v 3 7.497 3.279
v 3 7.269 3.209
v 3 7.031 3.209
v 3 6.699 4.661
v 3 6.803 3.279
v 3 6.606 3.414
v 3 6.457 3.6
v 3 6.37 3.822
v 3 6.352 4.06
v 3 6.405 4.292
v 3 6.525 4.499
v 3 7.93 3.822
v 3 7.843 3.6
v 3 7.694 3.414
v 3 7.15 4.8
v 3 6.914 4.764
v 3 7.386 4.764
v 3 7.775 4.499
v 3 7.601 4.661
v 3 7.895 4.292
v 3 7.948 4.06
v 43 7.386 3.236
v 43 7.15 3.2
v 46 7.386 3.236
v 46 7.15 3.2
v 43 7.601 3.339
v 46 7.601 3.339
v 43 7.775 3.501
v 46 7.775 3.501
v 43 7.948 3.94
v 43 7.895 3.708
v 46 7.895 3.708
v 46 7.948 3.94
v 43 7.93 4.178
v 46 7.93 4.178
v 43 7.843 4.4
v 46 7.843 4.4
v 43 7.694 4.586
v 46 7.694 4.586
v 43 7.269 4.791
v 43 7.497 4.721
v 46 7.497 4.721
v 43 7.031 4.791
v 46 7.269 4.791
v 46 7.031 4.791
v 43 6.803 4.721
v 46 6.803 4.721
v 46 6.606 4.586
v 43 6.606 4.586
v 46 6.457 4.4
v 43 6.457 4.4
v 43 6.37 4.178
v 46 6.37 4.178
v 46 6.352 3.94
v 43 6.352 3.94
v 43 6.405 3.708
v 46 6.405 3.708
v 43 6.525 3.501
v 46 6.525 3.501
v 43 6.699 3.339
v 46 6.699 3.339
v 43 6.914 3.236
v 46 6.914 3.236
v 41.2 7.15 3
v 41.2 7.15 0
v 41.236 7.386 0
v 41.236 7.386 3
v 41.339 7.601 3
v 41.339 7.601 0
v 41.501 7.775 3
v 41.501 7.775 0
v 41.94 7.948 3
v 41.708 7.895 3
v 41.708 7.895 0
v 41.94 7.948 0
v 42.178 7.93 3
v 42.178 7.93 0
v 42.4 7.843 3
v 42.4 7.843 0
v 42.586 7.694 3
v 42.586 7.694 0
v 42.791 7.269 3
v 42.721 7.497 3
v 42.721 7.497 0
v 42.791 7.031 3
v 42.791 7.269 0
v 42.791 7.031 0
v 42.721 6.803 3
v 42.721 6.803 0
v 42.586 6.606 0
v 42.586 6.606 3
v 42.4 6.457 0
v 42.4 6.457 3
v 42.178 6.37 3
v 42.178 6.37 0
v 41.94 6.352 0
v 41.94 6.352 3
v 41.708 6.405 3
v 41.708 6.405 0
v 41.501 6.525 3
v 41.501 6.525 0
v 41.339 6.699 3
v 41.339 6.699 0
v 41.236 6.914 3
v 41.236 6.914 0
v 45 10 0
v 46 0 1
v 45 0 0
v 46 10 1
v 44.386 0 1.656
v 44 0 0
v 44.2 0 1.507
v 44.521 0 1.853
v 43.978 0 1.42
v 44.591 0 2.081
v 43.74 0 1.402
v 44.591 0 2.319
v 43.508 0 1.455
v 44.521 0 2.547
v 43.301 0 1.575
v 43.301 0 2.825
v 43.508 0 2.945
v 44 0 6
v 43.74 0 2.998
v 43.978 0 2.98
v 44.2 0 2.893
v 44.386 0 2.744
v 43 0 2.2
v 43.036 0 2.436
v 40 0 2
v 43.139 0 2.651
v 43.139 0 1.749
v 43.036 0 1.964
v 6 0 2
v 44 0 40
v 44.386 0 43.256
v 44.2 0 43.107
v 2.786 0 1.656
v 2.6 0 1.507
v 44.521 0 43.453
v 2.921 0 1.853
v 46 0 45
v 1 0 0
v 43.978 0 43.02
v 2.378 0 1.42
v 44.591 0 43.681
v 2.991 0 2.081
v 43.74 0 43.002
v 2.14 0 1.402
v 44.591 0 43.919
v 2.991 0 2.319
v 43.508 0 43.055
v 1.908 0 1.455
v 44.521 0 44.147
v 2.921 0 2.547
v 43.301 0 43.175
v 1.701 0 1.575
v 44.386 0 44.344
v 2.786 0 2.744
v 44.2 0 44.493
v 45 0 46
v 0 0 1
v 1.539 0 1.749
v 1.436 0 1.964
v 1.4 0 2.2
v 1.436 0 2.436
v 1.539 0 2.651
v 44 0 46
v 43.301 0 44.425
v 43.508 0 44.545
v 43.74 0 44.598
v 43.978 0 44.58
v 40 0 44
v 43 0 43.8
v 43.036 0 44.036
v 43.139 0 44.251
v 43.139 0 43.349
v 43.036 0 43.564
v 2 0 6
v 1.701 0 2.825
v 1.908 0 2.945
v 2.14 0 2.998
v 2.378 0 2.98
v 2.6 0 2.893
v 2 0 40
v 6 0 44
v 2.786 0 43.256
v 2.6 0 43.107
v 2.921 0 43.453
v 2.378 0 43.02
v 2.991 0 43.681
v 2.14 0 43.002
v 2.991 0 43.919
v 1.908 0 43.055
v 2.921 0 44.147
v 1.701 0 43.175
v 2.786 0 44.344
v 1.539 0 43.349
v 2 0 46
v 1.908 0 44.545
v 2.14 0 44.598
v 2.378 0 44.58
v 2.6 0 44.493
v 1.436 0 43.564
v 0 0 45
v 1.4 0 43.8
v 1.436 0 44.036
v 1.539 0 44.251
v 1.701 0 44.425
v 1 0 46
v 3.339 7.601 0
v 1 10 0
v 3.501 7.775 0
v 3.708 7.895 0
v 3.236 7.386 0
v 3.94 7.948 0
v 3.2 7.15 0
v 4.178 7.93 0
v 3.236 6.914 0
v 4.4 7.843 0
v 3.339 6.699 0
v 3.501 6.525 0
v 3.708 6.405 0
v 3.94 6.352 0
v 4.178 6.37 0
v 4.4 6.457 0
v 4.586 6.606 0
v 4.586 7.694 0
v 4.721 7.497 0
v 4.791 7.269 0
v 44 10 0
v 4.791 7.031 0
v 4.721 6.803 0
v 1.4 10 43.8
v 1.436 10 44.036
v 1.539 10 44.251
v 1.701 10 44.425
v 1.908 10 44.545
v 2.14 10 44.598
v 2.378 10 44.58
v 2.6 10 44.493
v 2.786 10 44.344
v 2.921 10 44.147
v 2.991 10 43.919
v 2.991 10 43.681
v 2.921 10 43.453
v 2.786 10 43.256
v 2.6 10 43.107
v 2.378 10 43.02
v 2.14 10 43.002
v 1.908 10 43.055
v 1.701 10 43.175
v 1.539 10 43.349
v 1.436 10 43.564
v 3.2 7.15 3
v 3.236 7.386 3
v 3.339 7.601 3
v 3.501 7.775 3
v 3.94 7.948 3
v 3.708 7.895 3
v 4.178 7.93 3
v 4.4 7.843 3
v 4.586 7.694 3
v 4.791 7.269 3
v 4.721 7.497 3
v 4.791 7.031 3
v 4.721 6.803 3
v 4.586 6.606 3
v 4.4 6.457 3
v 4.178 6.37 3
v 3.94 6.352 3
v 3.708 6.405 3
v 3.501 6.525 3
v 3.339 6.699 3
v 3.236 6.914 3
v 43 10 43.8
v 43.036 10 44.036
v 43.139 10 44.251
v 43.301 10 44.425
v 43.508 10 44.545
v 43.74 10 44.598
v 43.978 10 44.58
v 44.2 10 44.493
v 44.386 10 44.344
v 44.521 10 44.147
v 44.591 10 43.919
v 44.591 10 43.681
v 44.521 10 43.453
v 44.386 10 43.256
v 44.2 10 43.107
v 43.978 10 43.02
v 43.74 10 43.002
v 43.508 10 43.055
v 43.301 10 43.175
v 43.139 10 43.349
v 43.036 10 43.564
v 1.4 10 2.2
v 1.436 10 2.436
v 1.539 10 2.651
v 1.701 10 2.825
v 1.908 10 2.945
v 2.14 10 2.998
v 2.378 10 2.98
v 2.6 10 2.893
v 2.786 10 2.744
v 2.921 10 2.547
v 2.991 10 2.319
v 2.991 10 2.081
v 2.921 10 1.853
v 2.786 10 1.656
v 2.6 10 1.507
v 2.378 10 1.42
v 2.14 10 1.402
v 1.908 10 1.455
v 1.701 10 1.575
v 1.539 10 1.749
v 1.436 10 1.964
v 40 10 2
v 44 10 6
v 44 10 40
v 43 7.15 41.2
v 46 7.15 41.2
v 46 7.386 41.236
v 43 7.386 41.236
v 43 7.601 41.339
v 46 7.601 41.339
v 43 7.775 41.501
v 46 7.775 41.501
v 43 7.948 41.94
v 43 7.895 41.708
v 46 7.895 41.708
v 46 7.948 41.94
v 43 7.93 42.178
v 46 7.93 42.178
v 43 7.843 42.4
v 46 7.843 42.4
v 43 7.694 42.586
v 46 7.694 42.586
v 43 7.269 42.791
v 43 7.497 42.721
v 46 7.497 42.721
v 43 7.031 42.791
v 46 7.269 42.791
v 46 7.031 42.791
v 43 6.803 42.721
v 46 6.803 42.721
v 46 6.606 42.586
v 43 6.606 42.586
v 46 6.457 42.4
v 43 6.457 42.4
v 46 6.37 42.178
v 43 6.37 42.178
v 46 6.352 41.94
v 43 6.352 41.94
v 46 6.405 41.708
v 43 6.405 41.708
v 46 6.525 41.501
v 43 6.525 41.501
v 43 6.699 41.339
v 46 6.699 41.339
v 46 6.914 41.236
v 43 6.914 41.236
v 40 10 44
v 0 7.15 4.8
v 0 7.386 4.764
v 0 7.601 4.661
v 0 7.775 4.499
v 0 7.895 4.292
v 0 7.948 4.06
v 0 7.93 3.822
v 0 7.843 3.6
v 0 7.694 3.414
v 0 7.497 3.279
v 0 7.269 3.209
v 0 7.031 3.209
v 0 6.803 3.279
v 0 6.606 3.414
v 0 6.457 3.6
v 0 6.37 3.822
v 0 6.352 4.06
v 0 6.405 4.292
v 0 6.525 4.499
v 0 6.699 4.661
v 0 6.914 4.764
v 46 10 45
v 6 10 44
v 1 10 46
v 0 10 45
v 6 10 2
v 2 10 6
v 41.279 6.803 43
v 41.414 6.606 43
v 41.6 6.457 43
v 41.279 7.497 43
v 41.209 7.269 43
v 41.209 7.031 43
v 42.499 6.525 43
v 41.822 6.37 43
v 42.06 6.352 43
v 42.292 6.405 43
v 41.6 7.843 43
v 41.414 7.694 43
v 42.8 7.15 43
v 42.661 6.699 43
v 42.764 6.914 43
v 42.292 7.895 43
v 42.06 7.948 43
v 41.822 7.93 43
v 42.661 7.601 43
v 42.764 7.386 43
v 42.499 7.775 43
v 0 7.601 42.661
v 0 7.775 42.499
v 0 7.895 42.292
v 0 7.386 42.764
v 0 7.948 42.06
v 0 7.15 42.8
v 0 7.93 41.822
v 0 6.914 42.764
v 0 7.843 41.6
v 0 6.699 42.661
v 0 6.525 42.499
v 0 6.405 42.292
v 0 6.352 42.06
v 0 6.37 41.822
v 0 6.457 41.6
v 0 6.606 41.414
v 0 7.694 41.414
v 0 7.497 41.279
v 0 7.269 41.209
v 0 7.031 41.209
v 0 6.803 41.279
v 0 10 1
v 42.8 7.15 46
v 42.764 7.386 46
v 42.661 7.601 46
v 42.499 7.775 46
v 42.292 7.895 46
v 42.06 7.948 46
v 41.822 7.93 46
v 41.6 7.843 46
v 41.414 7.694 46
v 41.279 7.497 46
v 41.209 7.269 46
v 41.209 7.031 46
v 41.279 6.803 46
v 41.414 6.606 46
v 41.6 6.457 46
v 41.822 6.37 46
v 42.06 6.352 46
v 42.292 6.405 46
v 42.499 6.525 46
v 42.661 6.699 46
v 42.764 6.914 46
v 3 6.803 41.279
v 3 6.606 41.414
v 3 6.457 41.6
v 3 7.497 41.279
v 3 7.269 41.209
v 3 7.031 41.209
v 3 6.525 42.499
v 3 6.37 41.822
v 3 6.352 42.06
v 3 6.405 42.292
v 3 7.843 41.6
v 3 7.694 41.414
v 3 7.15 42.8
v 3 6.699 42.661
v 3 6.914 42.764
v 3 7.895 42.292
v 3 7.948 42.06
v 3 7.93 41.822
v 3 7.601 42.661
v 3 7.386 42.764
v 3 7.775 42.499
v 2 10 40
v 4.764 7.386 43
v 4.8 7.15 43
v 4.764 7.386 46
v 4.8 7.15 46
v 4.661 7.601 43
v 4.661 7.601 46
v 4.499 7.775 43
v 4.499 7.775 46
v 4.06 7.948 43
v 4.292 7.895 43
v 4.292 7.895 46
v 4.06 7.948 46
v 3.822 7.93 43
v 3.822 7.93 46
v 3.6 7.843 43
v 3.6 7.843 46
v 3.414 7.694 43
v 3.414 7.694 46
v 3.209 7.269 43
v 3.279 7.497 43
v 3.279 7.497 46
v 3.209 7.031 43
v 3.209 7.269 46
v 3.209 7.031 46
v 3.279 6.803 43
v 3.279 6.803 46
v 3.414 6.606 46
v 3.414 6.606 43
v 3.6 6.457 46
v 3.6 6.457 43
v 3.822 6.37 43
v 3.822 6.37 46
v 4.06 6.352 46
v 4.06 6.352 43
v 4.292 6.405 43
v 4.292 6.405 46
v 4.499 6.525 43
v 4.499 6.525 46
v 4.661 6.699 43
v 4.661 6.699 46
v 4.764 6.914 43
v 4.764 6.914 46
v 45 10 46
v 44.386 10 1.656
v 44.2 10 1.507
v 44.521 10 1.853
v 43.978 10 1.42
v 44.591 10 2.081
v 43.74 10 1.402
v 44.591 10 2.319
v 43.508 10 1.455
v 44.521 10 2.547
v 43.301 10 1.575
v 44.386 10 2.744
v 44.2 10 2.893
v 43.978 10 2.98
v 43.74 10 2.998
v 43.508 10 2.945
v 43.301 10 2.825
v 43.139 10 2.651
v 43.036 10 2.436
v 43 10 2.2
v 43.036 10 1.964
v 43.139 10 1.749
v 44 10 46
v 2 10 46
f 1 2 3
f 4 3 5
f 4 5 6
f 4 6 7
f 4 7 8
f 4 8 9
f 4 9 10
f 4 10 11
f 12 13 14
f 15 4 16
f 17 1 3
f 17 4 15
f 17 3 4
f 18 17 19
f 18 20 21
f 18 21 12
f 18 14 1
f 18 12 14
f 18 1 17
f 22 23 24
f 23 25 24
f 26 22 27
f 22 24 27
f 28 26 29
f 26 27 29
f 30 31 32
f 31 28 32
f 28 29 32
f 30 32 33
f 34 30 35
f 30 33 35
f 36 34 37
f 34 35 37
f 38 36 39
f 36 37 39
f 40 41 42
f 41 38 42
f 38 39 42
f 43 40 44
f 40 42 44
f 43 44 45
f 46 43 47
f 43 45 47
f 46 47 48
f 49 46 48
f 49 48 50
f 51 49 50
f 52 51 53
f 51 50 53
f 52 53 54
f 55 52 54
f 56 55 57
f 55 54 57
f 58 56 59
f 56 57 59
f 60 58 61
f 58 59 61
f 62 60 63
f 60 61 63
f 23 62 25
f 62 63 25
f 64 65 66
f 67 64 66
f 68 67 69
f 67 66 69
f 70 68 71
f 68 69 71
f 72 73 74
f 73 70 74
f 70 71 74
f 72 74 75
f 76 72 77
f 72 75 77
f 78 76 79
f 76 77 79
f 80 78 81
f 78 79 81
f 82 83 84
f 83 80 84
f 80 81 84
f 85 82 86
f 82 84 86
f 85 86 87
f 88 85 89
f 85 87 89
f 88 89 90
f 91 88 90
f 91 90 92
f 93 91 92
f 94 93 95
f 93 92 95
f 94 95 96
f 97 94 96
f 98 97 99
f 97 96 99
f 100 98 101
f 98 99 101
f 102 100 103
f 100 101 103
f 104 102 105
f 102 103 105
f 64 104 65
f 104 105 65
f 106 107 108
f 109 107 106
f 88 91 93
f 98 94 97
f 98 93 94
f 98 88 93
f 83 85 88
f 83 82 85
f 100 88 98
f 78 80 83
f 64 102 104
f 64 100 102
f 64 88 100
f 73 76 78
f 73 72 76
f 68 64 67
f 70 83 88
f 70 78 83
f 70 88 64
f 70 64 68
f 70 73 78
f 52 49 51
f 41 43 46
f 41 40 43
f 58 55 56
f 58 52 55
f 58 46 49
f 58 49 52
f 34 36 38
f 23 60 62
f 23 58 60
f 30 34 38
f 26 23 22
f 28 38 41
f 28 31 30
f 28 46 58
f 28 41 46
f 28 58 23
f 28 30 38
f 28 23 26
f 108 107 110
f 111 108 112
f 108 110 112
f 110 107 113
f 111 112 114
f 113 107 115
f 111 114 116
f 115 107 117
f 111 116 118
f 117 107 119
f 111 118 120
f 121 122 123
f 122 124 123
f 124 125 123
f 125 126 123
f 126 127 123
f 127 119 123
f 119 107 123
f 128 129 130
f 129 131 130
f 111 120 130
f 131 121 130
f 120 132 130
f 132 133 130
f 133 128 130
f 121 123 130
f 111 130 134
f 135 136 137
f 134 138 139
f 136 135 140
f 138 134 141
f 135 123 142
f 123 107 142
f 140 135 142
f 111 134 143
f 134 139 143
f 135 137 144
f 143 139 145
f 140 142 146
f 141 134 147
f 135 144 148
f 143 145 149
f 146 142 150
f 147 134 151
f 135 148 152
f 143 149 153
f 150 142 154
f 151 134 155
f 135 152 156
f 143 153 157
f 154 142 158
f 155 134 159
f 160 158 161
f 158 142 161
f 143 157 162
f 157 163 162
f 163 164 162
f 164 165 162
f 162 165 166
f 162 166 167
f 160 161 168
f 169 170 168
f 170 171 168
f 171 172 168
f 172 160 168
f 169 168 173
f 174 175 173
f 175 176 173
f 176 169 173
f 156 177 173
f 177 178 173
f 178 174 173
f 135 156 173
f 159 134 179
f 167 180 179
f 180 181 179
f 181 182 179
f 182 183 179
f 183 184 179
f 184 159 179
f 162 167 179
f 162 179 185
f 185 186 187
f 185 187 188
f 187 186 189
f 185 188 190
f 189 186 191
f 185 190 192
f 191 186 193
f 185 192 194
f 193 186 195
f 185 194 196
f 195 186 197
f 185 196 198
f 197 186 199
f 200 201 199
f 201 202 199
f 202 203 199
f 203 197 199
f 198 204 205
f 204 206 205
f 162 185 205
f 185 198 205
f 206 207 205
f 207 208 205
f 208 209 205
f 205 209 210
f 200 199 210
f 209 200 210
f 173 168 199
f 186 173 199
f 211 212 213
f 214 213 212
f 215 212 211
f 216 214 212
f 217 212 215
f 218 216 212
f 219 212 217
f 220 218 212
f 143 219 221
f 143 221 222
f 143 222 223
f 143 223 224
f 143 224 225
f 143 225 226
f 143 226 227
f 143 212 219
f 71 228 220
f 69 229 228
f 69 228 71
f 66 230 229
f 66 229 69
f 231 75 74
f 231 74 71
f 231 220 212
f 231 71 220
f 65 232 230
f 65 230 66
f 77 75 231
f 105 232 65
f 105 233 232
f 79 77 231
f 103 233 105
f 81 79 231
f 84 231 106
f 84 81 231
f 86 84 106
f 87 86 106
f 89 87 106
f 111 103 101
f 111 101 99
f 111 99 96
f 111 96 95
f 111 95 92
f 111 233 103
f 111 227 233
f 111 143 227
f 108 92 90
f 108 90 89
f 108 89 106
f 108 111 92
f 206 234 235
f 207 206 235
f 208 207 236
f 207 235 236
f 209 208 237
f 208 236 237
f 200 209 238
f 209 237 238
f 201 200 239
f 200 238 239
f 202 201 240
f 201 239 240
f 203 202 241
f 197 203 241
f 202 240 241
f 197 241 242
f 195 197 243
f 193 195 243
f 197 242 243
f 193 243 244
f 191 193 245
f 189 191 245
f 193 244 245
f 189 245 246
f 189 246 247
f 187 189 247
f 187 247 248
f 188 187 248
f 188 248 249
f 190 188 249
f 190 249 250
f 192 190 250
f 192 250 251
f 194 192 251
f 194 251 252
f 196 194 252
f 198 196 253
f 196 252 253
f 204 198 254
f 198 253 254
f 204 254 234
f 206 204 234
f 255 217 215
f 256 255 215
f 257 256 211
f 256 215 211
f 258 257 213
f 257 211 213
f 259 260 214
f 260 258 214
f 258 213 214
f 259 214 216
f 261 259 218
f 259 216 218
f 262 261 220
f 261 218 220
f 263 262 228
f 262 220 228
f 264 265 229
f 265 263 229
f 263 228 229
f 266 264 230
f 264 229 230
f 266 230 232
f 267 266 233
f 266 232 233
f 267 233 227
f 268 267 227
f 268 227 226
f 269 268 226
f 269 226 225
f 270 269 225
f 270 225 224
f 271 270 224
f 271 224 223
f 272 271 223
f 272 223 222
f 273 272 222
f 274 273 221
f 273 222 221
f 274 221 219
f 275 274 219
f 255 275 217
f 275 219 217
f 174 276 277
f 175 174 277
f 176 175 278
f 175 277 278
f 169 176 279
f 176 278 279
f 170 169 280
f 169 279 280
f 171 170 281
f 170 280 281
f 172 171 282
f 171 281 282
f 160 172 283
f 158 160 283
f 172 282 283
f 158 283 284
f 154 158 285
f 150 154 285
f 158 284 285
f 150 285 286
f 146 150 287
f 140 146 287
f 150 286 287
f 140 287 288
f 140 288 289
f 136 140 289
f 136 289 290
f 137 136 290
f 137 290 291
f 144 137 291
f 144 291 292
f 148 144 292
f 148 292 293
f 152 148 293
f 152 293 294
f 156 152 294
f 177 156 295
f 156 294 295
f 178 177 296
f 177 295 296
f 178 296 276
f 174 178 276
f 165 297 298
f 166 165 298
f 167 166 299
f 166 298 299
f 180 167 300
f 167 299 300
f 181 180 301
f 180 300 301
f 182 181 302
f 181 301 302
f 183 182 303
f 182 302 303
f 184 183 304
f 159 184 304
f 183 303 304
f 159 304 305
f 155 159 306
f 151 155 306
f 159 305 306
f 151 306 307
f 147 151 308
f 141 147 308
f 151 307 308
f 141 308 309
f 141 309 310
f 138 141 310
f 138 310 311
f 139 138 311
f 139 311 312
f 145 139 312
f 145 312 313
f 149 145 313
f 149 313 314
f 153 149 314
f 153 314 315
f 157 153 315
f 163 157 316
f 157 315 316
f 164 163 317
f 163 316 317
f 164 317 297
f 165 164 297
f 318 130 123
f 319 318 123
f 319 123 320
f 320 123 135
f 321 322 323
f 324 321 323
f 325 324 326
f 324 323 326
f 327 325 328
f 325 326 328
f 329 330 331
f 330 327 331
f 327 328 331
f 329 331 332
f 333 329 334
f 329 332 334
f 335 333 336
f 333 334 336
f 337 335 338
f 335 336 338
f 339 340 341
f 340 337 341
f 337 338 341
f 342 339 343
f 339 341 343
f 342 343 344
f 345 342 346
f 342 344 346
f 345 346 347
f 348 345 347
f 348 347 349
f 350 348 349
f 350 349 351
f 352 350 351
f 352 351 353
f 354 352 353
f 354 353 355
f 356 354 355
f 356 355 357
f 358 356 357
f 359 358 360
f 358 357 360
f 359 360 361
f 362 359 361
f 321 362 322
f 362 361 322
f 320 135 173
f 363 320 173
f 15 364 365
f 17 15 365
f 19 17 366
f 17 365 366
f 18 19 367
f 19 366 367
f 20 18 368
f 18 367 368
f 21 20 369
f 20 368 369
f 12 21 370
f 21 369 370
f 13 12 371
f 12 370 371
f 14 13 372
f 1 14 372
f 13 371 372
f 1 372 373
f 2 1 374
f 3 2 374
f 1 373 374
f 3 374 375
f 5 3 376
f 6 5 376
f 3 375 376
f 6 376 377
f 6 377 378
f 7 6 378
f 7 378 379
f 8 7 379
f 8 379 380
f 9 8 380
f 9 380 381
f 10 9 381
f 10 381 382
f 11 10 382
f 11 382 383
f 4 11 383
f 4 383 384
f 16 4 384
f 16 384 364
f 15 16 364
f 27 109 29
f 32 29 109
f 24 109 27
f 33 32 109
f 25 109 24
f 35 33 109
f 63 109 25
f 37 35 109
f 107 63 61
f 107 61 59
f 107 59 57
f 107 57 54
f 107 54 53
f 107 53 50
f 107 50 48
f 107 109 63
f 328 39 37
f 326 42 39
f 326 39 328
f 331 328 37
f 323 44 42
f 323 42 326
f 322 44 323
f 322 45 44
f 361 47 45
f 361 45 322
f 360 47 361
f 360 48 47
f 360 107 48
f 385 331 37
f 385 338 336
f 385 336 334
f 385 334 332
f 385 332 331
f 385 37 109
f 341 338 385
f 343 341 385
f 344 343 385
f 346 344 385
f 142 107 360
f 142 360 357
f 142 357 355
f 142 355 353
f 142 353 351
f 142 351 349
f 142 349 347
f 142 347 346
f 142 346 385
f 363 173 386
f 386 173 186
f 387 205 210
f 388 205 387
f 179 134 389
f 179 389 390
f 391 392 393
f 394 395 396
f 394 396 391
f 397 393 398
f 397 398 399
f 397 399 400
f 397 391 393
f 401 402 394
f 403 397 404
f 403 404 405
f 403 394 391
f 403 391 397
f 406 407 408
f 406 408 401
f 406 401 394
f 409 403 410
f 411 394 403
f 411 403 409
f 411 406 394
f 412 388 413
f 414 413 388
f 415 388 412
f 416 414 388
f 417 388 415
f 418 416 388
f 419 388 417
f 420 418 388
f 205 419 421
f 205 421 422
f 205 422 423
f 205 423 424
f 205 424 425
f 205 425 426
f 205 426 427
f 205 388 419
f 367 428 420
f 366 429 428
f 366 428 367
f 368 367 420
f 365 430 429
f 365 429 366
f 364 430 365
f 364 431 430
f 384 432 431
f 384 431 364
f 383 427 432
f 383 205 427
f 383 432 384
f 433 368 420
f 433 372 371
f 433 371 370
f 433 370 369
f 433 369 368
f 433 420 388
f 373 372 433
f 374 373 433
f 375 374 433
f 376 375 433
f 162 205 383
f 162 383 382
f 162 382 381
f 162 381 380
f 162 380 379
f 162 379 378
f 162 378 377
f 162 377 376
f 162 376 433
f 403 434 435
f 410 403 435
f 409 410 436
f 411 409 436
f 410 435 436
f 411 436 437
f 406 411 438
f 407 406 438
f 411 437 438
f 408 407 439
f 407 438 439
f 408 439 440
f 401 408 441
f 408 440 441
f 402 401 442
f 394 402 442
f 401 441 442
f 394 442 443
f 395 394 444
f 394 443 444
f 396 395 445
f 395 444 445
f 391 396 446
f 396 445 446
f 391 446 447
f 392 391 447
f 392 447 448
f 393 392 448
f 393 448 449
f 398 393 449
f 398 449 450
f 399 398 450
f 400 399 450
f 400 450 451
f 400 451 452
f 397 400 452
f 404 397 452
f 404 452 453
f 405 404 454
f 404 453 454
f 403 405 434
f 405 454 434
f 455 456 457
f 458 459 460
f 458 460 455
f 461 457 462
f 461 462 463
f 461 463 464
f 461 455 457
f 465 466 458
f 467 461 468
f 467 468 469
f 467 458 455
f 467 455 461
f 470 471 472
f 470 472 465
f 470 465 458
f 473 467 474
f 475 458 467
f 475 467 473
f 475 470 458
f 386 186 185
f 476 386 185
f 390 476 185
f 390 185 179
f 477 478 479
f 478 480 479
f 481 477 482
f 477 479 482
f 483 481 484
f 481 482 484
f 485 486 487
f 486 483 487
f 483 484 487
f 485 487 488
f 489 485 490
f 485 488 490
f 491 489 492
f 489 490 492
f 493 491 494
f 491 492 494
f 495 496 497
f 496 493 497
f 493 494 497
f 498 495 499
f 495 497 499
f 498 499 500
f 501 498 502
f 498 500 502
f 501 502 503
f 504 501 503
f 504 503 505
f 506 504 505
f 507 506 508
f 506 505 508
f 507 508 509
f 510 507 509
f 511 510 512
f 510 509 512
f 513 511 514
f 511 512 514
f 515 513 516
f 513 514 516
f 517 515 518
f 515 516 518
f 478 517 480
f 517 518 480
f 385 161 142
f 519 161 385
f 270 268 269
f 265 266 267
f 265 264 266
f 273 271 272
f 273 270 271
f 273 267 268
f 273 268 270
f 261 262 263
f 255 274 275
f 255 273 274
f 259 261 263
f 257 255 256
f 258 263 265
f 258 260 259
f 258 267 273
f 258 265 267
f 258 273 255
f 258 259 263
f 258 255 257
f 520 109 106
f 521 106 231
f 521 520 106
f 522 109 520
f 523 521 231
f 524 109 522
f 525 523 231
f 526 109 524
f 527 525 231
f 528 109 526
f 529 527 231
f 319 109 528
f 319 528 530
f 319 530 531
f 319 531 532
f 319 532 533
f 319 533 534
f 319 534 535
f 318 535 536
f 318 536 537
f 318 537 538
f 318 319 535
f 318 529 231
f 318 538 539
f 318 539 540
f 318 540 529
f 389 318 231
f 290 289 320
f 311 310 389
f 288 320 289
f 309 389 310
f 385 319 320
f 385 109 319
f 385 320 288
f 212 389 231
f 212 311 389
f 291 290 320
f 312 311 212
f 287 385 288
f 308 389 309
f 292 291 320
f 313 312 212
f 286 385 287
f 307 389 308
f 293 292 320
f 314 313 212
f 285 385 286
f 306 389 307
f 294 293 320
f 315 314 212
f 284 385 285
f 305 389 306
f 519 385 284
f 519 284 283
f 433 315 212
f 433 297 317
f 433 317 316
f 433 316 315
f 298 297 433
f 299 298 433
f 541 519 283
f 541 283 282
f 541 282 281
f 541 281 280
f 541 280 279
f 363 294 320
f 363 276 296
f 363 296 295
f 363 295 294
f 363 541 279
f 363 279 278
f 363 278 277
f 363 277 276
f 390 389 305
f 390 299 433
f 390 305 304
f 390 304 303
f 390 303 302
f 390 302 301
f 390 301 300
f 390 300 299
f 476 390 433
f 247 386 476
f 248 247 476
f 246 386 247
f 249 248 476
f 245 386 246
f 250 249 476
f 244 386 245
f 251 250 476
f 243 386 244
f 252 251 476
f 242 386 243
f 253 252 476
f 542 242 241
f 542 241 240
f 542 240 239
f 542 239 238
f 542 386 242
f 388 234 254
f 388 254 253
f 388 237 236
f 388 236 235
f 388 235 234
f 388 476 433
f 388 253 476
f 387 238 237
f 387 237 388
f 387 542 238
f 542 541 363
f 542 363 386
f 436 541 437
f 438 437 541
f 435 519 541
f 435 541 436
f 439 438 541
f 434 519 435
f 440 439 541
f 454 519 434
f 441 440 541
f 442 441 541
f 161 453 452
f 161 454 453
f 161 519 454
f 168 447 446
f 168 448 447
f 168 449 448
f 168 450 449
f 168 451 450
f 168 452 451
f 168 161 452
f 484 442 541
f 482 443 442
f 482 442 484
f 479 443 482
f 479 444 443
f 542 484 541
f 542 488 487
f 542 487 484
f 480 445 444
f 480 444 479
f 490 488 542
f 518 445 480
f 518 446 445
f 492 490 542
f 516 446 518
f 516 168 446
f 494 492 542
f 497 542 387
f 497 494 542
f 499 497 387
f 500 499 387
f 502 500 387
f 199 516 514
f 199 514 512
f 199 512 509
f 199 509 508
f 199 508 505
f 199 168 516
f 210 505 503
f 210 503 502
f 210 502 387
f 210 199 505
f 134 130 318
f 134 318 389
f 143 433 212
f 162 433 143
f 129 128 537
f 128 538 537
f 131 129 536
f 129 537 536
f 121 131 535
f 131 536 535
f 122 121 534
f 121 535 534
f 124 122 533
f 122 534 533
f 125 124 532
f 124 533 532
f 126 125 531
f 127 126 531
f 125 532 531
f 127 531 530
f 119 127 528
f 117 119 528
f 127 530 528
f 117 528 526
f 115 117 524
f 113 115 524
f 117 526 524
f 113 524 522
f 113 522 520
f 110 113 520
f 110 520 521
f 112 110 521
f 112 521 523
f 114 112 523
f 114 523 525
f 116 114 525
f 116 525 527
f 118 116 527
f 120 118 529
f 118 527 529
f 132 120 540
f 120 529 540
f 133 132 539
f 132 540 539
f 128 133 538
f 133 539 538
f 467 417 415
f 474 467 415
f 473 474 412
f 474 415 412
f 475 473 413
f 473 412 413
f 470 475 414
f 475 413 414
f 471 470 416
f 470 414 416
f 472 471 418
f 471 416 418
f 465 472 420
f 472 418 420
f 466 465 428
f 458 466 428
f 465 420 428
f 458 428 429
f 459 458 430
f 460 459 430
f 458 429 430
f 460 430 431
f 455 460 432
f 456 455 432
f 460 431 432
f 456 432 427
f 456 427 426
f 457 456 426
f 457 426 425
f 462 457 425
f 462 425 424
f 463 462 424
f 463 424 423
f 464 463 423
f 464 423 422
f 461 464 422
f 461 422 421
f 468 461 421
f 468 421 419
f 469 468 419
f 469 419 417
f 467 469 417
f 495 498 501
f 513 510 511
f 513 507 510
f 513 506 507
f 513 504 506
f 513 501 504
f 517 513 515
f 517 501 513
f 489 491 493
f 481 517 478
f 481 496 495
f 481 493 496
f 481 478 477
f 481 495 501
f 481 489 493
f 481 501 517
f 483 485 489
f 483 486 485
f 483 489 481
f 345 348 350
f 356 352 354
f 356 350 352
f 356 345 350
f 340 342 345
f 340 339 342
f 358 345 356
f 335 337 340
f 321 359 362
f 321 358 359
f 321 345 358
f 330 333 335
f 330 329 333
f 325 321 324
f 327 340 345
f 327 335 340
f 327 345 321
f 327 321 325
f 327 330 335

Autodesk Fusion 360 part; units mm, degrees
sketch "Sketch1" plane through (0, 0, 0) normal (0, 1, 0) x (1, 0, 0)
  line L0 (0, 0) -> (46, 0)
  line L1 (46, 0) -> (46, -46)
  line L2 (46, -46) -> (0, -46)
  line L3 (0, -46) -> (0, 0)
  line L4 (0, 0) -> (6.364, -6.364)
  line L5 (0, 0) -> (9, 0) construction
  line L6 (6.364, -6.364) -> (0, -6.364)
  line L7 (0, -6.364) -> (0, 0)
  line L8 (0, 0) -> (6.364, 0)
  line L9 (6.364, 0) -> (6.364, -6.364)
  line L10 (46, -46) -> (37, -46)
  line L11 (37, -46) -> (37, -37)
  line L12 (37, -37) -> (46, -37)
  line L13 (46, -37) -> (46, -46)
  line L14 (46, 0) -> (37, 0)
  line L15 (37, 0) -> (37, -9)
  line L16 (37, -9) -> (46, -9)
  line L17 (46, -9) -> (46, 0)
  line L18 (0, -46) -> (9, -46)
  line L19 (9, -46) -> (9, -37)
  line L20 (9, -37) -> (0, -37)
  line L21 (0, -37) -> (0, -46)
  line L22 (0, -46) -> (2, -46)
  line L23 (2, -46) -> (2, -44)
  circle A0 centre (2, -44) radius 1
  circle A1 centre (2, -44) radius 0.8
  line L24 (23, 0) -> (23, -46)
  line L25 (23, -23) -> (42, -23)
  line L26 (42, -23) -> (42, -42)
  line L27 (42, -42) -> (4, -42)
  line L28 (4, -42) -> (4, -4)
  line L29 (4, -4) -> (42, -4)
  line L30 (42, -4) -> (42, -42)
  line L31 (4, -42) -> (8, -46)
  line L32 (4, -42) -> (9.6569, -42) construction
  line L33 (8, -46) -> (0, -38)
  line L34 (46, -46) -> (44, -46)
  line L35 (44, -46) -> (44, -44)
  circle A2 centre (44, -44) radius 0.8
  line L36 (42, -42) -> (46, -38)
  line L37 (42, -42) -> (38, -46)
  line L38 (46, 0) -> (44, 0)
  line L39 (44, 0) -> (44, -2)
  circle A3 centre (44, -2) radius 0.8
  line L40 (42, -4) -> (46, -8)
  line L41 (46, -8) -> (38, 0)
  line L42 (4, -4) -> (8, 0)
  line L43 (4, -4) -> (0, -8)
  line L44 (0, 0) -> (1.4142, -1.4142)
  circle A4 centre (1.4142, -1.4142) radius 0.8
  line L45 (23, 0) -> (23, -2)
  line L46 (40, -2) -> (6, -2)
  line L47 (44, -6) -> (44, -40)
  line L48 (40, -44) -> (6, -44)
  line L49 (2, -40) -> (2, -6)
  dimension "d1" = 46
  dimension "d2" = 46
  dimension "d3" = 45
  dimension "d4" = 9
  dimension "d5" = 9
  dimension "d6" = 9
  dimension "d7" = 9
  dimension "d8" = 9
  dimension "d9" = 9
  dimension "d10" = 2
  dimension "d11" = 1.6
  dimension "d12" = 19
  dimension "d13" = 19
  dimension "d14" = 45
  dimension "d15" = 1.6
extrude "Extrude1" add sketch "Sketch1" along normal blind 10 contours L3 L4 L6 L7 L43 L44 A4 | L0 L4 L8 L9 L42 L44 A4 | L0 L9 L42 | L3 L6 L43 | L0 L9 L24 L42 L45 L46 | L9 L42 L46 | L3 L6 L20 L43 L49 | L0 L15 L24 L45 L46 | L3 L20 L21 L33 L49 | L0 L14 L15 L41 L46 | L2 L3 L18 L21 L22 L31 L33 | L0 L1 L14 L17 L38 L40 L41 | L2 L18 L19 L31 L33 L48 | L1 L16 L17 L40 L41 L47 | L2 L11 L24 L48 | L2 L19 L24 L48 | L1 L12 L16 L47 | L2 L10 L11 L37 L48 | L1 L2 L10 L13 L34 L36 L37 | L1 L12 L13 L36 L47
sketch "Sketch2" plane through (46, 0, 0) normal (1, 0, 0) x (0, 0, -1)
  line L0 (-46, 0) -> (0, 0)
  line L1 (0, 0) -> (0, 10)
  line L2 (0, 10) -> (-46, 10)
  line L3 (-46, 10) -> (-46, 0)
  line L4 (-43, 0) -> (-43, 7.15)
  line L5 (-43, 7.15) -> (-46.6287, 7.15)
  line L6 (-46, 7.15) -> (-42, 7.15)
  circle A0 centre (-42, 7.15) radius 0.8
extrude "Extrude2" cut sketch "Sketch2" against normal blind 3 contours A0
sketch "Sketch3" plane through (0, 0, 46) normal (0, 0, 1) x (1, 0, 0)
  line L0 (0, 0) -> (46, 0)
  line L1 (46, 0) -> (46, 10)
  line L2 (46, 10) -> (0, 10)
  line L3 (0, 10) -> (0, 0)
  line L4 (43.2, 0) -> (43.2, 7.15)
  line L5 (43.2, 7.15) -> (46.5827, 7.15)
  line L6 (46, 7.15) -> (42, 7.15)
  circle A0 centre (42, 7.15) radius 0.8
  dimension "d20" = 7.15
  dimension "d21" = 1.6
extrude "Extrude3" cut sketch "Sketch3" against normal blind 3 contours A0
sketch "Sketch4" plane through (46, 0, 0) normal (1, 0, 0) x (0, 0, -1)
  circle A0 centre (-42, 7.15) radius 0.8
  line L0 (-46, 0) -> (0, 0)
  line L1 (0, 0) -> (0, 10)
  line L2 (0, 10) -> (-46, 10)
  line L3 (-46, 10) -> (-46, 0)
  line L4 (0, 0) -> (-4, 0)
  line L5 (-4, 0) -> (-4, 7.15)
  circle A1 centre (-4, 7.15) radius 0.8
extrude "Extrude4" cut sketch "Sketch4" against normal blind 3 contours A1
sketch "Sketch5" plane through (0, 0, 0) normal (0, 0, -1) x (-1, 0, 0)
  line L0 (-46, 0) -> (0, 0)
  line L1 (0, 0) -> (0, 10)
  line L2 (0, 10) -> (-46, 10)
  line L3 (-46, 10) -> (-46, 0)
  line L4 (-46, 0) -> (-42, 0)
  line L5 (-42, 0) -> (-42, 7.15)
  circle A0 centre (-42, 7.15) radius 0.8
extrude "Extrude5" cut sketch "Sketch5" against normal blind 3 contours A0
sketch "Sketch6" plane through (0, 0, 0) normal (0, 0, -1) x (-1, 0, 0)
  circle A0 centre (-42, 7.15) radius 0.8
  line L0 (-46, 0) -> (0, 0)
  line L1 (0, 0) -> (0, 10)
  line L2 (0, 10) -> (-46, 10)
  line L3 (-46, 10) -> (-46, 0)
  line L4 (0, 0) -> (-4, 0)
  line L5 (-4, 0) -> (-4, 7.15)
  circle A1 centre (-4, 7.15) radius 0.8
extrude "Extrude6" cut sketch "Sketch6" against normal blind 3 contours A1
sketch "Sketch7" plane through (0, 0, 0) normal (-1, 0, 0) x (0, 0, 1)
  line L0 (0, 0) -> (46, 0)
  line L1 (46, 0) -> (46, 10)
  line L2 (46, 10) -> (0, 10)
  line L3 (0, 10) -> (0, 0)
  line L4 (0, 0) -> (4, 0)
  line L5 (4, 0) -> (4, 7.15)
  line L6 (46, 0) -> (42, 0)
  line L7 (42, 0) -> (42, 7.15)
  circle A0 centre (42, 7.15) radius 0.8
  circle A1 centre (4, 7.15) radius 0.8
extrude "Extrude7" cut sketch "Sketch7" against normal blind 3 contours A1 | A0
sketch "Sketch8" plane through (0, 10, 0) normal (0, 1, 0) x (-1, 0, 0)
  circle A0 centre (-1.4142, 1.4142) radius 0.8
  circle A1 centre (-44, 2) radius 0.8
  line L0 (-44, 40) -> (-42, 42)
  line L1 (-42, 42) -> (-40, 44)
  line L2 (-40, 44) -> (-6, 44)
  line L3 (-6, 44) -> (-2, 40)
  line L4 (-2, 40) -> (-2, 6.364)
  line L5 (-2, 6.364) -> (-1.636, 6.364)
  line L6 (-1.636, 6.364) -> (-6, 2)
  line L7 (-6, 2) -> (-40, 2)
  line L8 (-40, 2) -> (-44, 6)
  line L9 (-44, 6) -> (-44, 40)
  circle A2 centre (-44, 44) radius 0.8
  circle A3 centre (-2, 44) radius 1
  line L10 (-46, 46) -> (-46, 0)
  line L11 (-46, 0) -> (0, 0)
  line L12 (0, 0) -> (0, 46)
  line L13 (0, 46) -> (-46, 46)
  circle A4 centre (-2, 44) radius 1
  circle A5 centre (-2, 44) radius 0.8
extrude "Extrude8" add sketch "Sketch8" against normal blind 10 contours A3 A4
sketch "Sketch9" plane through (0, 0, 46) normal (0, 0, 1) x (1, 0, 0)
  circle A0 centre (42, 7.15) radius 0.8
  line L0 (0, 0) -> (46, 0)
  line L1 (46, 0) -> (46, 10)
  line L2 (46, 10) -> (0, 10)
  line L3 (0, 10) -> (0, 0)
  line L4 (0, 0) -> (4, 0)
  line L5 (4, 0) -> (4, 7.15)
  circle A1 centre (4, 7.15) radius 0.8
extrude "Extrude9" cut sketch "Sketch9" against normal blind 3 contours A1
sketch "Sketch10" plane through (0, 10, 0) normal (0, 1, 0) x (-1, 0, 0)
  circle A0 centre (-2, 44) radius 0.8
  circle A1 centre (-1.4142, 1.4142) radius 0.8
  circle A2 centre (-44, 2) radius 0.8
  line L0 (-44, 40) -> (-42, 42)
  line L1 (-42, 42) -> (-40, 44)
  line L2 (-40, 44) -> (-6, 44)
  line L3 (-6, 44) -> (-2, 40)
  line L4 (-2, 40) -> (-2, 6.364)
  line L5 (-2, 6.364) -> (-1.636, 6.364)
  line L6 (-1.636, 6.364) -> (-6, 2)
  line L7 (-6, 2) -> (-40, 2)
  line L8 (-40, 2) -> (-44, 6)
  line L9 (-44, 6) -> (-44, 40)
  circle A3 centre (-44, 44) radius 0.8
  line L10 (-46, 46) -> (-46, 0)
  line L11 (-46, 0) -> (0, 0)
  line L12 (0, 0) -> (0, 46)
  line L13 (0, 46) -> (-46, 46)
  line L14 (-2, 6.364) -> (-2, 5.5)
  line L15 (-2, 5.5) -> (-1.568, 5.932)
  line L16 (-1.568, 5.932) -> (-1.5, 7)
  line L17 (-1.5, 7) -> (-2, 6.364)
extrude "Extrude10" add sketch "Sketch10" against normal blind 10 contours L5 L6 L14
sketch "Sketch11" plane through (0, 10, 0) normal (0, 1, 0) x (-1, 0, 0)
  circle A0 centre (-2, 44) radius 0.8
  circle A1 centre (-1.4142, 1.4142) radius 0.8
  circle A2 centre (-44, 2) radius 0.8
  line L0 (-44, 40) -> (-42, 42)
  line L1 (-42, 42) -> (-40, 44)
  line L2 (-40, 44) -> (-6, 44)
  line L3 (-6, 44) -> (-2, 40)
  line L4 (-2, 40) -> (-2, 6)
  line L5 (-2, 6) -> (-6, 2)
  line L6 (-6, 2) -> (-40, 2)
  line L7 (-40, 2) -> (-44, 6)
  line L8 (-44, 6) -> (-44, 40)
  circle A3 centre (-44, 44) radius 0.8
  line L9 (-46, 46) -> (-46, 0)
  line L10 (-46, 0) -> (0, 0)
  line L11 (0, 0) -> (0, 46)
  line L12 (0, 46) -> (-46, 46)
  circle A4 centre (-1.4142, 1.4142) radius 0.8
extrude "Extrude11" add sketch "Sketch11" against normal blind 10 contours A1 A4
sketch "Sketch12" plane through (0, 10, 0) normal (0, 1, 0) x (-1, 0, 0)
  circle A0 centre (-2, 44) radius 0.8
  circle A1 centre (-44, 2) radius 0.8
  line L0 (-44, 40) -> (-42, 42)
  line L1 (-42, 42) -> (-40, 44)
  line L2 (-40, 44) -> (-6, 44)
  line L3 (-6, 44) -> (-2, 40)
  line L4 (-2, 40) -> (-2, 6)
  line L5 (-2, 6) -> (-6, 2)
  line L6 (-6, 2) -> (-40, 2)
  line L7 (-40, 2) -> (-44, 6)
  line L8 (-44, 6) -> (-44, 40)
  circle A2 centre (-44, 44) radius 0.8
  line L9 (-46, 46) -> (-46, 0)
  line L10 (-46, 0) -> (0, 0)
  line L11 (0, 0) -> (0, 46)
  line L12 (0, 46) -> (-46, 46)
  line L13 (0, 0) -> (-2, 0)
  line L14 (-2, 0) -> (-2, 2)
  circle A3 centre (-2, 2) radius 0.8
extrude "Extrude12" cut sketch "Sketch12" against normal blind 24.5 contours A3
chamfer "Chamfer1" distance 1 angle 45 4 edges at (0, 5, 0) (0, 5, 46) (46, 5, 46) (46, 5, 0)
sketch "Sketch13" plane through (0, 10, 0) normal (0, 1, 0) x (-1, 0, 0)
  line L0 (-46, 1) -> (-45, 0)
  line L1 (-45, 0) -> (-1, 0)
  line L2 (-1, 0) -> (0, 1)
  line L3 (0, 1) -> (0, 45)
  line L4 (0, 45) -> (-1, 46)
  line L5 (-1, 46) -> (-45, 46)
  line L6 (-45, 46) -> (-46, 45)
  line L7 (-46, 45) -> (-46, 1)
  circle A0 centre (-2, 2) radius 0.8
  circle A1 centre (-2, 44) radius 0.8
  circle A2 centre (-44, 2) radius 0.8
  line L8 (-44, 40) -> (-42, 42)
  line L9 (-42, 42) -> (-40, 44)
  line L10 (-40, 44) -> (-6, 44)
  line L11 (-6, 44) -> (-2, 40)
  line L12 (-2, 40) -> (-2, 6)
  line L13 (-2, 6) -> (-6, 2)
  line L14 (-6, 2) -> (-40, 2)
  line L15 (-40, 2) -> (-44, 6)
  line L16 (-44, 6) -> (-44, 40)
  circle A3 centre (-44, 44) radius 0.8
extrude "Extrude13" add sketch "Sketch13" against normal blind 10 contours A0 | A1 | A2 | A3
sketch "Sketch14" plane through (0, 10, 0) normal (0, 1, 0) x (-1, 0, 0)
  line L0 (-46, 1) -> (-45, 0)
  line L1 (-45, 0) -> (-1, 0)
  line L2 (-1, 0) -> (0, 1)
  line L3 (0, 1) -> (0, 45)
  line L4 (0, 45) -> (-1, 46)
  line L5 (-1, 46) -> (-45, 46)
  line L6 (-45, 46) -> (-46, 45)
  line L7 (-46, 45) -> (-46, 1)
  line L8 (-44, 40) -> (-42, 42)
  line L9 (-42, 42) -> (-40, 44)
  line L10 (-40, 44) -> (-6, 44)
  line L11 (-6, 44) -> (-2, 40)
  line L12 (-2, 40) -> (-2, 6)
  line L13 (-2, 6) -> (-6, 2)
  line L14 (-6, 2) -> (-40, 2)
  line L15 (-40, 2) -> (-44, 6)
  line L16 (-44, 6) -> (-44, 40)
  line L17 (0, 0) -> (-2.2, 0)
  line L18 (-2.2, 0) -> (-2.2, 2.2)
  line L19 (-46, 0) -> (-46, 2.2)
  line L20 (-46, 2.2) -> (-43.8, 2.2)
  line L21 (-46, 46) -> (-46, 43.8)
  line L22 (-46, 43.8) -> (-43.8, 43.8)
  line L23 (0, 46) -> (-2.2, 46)
  line L24 (-2.2, 46) -> (-2.2, 43.8)
  circle A0 centre (-2.2, 43.8) radius 0.8
  circle A1 centre (-43.8, 43.8) radius 0.8
  circle A2 centre (-43.8, 2.2) radius 0.8
  circle A3 centre (-2.2, 2.2) radius 0.8
  dimension "d46" = 2.2
  dimension "d47" = 1.6
extrude "Extrude14" cut sketch "Sketch14" against normal blind 20 contours A3 | A0 | A1 | A2
